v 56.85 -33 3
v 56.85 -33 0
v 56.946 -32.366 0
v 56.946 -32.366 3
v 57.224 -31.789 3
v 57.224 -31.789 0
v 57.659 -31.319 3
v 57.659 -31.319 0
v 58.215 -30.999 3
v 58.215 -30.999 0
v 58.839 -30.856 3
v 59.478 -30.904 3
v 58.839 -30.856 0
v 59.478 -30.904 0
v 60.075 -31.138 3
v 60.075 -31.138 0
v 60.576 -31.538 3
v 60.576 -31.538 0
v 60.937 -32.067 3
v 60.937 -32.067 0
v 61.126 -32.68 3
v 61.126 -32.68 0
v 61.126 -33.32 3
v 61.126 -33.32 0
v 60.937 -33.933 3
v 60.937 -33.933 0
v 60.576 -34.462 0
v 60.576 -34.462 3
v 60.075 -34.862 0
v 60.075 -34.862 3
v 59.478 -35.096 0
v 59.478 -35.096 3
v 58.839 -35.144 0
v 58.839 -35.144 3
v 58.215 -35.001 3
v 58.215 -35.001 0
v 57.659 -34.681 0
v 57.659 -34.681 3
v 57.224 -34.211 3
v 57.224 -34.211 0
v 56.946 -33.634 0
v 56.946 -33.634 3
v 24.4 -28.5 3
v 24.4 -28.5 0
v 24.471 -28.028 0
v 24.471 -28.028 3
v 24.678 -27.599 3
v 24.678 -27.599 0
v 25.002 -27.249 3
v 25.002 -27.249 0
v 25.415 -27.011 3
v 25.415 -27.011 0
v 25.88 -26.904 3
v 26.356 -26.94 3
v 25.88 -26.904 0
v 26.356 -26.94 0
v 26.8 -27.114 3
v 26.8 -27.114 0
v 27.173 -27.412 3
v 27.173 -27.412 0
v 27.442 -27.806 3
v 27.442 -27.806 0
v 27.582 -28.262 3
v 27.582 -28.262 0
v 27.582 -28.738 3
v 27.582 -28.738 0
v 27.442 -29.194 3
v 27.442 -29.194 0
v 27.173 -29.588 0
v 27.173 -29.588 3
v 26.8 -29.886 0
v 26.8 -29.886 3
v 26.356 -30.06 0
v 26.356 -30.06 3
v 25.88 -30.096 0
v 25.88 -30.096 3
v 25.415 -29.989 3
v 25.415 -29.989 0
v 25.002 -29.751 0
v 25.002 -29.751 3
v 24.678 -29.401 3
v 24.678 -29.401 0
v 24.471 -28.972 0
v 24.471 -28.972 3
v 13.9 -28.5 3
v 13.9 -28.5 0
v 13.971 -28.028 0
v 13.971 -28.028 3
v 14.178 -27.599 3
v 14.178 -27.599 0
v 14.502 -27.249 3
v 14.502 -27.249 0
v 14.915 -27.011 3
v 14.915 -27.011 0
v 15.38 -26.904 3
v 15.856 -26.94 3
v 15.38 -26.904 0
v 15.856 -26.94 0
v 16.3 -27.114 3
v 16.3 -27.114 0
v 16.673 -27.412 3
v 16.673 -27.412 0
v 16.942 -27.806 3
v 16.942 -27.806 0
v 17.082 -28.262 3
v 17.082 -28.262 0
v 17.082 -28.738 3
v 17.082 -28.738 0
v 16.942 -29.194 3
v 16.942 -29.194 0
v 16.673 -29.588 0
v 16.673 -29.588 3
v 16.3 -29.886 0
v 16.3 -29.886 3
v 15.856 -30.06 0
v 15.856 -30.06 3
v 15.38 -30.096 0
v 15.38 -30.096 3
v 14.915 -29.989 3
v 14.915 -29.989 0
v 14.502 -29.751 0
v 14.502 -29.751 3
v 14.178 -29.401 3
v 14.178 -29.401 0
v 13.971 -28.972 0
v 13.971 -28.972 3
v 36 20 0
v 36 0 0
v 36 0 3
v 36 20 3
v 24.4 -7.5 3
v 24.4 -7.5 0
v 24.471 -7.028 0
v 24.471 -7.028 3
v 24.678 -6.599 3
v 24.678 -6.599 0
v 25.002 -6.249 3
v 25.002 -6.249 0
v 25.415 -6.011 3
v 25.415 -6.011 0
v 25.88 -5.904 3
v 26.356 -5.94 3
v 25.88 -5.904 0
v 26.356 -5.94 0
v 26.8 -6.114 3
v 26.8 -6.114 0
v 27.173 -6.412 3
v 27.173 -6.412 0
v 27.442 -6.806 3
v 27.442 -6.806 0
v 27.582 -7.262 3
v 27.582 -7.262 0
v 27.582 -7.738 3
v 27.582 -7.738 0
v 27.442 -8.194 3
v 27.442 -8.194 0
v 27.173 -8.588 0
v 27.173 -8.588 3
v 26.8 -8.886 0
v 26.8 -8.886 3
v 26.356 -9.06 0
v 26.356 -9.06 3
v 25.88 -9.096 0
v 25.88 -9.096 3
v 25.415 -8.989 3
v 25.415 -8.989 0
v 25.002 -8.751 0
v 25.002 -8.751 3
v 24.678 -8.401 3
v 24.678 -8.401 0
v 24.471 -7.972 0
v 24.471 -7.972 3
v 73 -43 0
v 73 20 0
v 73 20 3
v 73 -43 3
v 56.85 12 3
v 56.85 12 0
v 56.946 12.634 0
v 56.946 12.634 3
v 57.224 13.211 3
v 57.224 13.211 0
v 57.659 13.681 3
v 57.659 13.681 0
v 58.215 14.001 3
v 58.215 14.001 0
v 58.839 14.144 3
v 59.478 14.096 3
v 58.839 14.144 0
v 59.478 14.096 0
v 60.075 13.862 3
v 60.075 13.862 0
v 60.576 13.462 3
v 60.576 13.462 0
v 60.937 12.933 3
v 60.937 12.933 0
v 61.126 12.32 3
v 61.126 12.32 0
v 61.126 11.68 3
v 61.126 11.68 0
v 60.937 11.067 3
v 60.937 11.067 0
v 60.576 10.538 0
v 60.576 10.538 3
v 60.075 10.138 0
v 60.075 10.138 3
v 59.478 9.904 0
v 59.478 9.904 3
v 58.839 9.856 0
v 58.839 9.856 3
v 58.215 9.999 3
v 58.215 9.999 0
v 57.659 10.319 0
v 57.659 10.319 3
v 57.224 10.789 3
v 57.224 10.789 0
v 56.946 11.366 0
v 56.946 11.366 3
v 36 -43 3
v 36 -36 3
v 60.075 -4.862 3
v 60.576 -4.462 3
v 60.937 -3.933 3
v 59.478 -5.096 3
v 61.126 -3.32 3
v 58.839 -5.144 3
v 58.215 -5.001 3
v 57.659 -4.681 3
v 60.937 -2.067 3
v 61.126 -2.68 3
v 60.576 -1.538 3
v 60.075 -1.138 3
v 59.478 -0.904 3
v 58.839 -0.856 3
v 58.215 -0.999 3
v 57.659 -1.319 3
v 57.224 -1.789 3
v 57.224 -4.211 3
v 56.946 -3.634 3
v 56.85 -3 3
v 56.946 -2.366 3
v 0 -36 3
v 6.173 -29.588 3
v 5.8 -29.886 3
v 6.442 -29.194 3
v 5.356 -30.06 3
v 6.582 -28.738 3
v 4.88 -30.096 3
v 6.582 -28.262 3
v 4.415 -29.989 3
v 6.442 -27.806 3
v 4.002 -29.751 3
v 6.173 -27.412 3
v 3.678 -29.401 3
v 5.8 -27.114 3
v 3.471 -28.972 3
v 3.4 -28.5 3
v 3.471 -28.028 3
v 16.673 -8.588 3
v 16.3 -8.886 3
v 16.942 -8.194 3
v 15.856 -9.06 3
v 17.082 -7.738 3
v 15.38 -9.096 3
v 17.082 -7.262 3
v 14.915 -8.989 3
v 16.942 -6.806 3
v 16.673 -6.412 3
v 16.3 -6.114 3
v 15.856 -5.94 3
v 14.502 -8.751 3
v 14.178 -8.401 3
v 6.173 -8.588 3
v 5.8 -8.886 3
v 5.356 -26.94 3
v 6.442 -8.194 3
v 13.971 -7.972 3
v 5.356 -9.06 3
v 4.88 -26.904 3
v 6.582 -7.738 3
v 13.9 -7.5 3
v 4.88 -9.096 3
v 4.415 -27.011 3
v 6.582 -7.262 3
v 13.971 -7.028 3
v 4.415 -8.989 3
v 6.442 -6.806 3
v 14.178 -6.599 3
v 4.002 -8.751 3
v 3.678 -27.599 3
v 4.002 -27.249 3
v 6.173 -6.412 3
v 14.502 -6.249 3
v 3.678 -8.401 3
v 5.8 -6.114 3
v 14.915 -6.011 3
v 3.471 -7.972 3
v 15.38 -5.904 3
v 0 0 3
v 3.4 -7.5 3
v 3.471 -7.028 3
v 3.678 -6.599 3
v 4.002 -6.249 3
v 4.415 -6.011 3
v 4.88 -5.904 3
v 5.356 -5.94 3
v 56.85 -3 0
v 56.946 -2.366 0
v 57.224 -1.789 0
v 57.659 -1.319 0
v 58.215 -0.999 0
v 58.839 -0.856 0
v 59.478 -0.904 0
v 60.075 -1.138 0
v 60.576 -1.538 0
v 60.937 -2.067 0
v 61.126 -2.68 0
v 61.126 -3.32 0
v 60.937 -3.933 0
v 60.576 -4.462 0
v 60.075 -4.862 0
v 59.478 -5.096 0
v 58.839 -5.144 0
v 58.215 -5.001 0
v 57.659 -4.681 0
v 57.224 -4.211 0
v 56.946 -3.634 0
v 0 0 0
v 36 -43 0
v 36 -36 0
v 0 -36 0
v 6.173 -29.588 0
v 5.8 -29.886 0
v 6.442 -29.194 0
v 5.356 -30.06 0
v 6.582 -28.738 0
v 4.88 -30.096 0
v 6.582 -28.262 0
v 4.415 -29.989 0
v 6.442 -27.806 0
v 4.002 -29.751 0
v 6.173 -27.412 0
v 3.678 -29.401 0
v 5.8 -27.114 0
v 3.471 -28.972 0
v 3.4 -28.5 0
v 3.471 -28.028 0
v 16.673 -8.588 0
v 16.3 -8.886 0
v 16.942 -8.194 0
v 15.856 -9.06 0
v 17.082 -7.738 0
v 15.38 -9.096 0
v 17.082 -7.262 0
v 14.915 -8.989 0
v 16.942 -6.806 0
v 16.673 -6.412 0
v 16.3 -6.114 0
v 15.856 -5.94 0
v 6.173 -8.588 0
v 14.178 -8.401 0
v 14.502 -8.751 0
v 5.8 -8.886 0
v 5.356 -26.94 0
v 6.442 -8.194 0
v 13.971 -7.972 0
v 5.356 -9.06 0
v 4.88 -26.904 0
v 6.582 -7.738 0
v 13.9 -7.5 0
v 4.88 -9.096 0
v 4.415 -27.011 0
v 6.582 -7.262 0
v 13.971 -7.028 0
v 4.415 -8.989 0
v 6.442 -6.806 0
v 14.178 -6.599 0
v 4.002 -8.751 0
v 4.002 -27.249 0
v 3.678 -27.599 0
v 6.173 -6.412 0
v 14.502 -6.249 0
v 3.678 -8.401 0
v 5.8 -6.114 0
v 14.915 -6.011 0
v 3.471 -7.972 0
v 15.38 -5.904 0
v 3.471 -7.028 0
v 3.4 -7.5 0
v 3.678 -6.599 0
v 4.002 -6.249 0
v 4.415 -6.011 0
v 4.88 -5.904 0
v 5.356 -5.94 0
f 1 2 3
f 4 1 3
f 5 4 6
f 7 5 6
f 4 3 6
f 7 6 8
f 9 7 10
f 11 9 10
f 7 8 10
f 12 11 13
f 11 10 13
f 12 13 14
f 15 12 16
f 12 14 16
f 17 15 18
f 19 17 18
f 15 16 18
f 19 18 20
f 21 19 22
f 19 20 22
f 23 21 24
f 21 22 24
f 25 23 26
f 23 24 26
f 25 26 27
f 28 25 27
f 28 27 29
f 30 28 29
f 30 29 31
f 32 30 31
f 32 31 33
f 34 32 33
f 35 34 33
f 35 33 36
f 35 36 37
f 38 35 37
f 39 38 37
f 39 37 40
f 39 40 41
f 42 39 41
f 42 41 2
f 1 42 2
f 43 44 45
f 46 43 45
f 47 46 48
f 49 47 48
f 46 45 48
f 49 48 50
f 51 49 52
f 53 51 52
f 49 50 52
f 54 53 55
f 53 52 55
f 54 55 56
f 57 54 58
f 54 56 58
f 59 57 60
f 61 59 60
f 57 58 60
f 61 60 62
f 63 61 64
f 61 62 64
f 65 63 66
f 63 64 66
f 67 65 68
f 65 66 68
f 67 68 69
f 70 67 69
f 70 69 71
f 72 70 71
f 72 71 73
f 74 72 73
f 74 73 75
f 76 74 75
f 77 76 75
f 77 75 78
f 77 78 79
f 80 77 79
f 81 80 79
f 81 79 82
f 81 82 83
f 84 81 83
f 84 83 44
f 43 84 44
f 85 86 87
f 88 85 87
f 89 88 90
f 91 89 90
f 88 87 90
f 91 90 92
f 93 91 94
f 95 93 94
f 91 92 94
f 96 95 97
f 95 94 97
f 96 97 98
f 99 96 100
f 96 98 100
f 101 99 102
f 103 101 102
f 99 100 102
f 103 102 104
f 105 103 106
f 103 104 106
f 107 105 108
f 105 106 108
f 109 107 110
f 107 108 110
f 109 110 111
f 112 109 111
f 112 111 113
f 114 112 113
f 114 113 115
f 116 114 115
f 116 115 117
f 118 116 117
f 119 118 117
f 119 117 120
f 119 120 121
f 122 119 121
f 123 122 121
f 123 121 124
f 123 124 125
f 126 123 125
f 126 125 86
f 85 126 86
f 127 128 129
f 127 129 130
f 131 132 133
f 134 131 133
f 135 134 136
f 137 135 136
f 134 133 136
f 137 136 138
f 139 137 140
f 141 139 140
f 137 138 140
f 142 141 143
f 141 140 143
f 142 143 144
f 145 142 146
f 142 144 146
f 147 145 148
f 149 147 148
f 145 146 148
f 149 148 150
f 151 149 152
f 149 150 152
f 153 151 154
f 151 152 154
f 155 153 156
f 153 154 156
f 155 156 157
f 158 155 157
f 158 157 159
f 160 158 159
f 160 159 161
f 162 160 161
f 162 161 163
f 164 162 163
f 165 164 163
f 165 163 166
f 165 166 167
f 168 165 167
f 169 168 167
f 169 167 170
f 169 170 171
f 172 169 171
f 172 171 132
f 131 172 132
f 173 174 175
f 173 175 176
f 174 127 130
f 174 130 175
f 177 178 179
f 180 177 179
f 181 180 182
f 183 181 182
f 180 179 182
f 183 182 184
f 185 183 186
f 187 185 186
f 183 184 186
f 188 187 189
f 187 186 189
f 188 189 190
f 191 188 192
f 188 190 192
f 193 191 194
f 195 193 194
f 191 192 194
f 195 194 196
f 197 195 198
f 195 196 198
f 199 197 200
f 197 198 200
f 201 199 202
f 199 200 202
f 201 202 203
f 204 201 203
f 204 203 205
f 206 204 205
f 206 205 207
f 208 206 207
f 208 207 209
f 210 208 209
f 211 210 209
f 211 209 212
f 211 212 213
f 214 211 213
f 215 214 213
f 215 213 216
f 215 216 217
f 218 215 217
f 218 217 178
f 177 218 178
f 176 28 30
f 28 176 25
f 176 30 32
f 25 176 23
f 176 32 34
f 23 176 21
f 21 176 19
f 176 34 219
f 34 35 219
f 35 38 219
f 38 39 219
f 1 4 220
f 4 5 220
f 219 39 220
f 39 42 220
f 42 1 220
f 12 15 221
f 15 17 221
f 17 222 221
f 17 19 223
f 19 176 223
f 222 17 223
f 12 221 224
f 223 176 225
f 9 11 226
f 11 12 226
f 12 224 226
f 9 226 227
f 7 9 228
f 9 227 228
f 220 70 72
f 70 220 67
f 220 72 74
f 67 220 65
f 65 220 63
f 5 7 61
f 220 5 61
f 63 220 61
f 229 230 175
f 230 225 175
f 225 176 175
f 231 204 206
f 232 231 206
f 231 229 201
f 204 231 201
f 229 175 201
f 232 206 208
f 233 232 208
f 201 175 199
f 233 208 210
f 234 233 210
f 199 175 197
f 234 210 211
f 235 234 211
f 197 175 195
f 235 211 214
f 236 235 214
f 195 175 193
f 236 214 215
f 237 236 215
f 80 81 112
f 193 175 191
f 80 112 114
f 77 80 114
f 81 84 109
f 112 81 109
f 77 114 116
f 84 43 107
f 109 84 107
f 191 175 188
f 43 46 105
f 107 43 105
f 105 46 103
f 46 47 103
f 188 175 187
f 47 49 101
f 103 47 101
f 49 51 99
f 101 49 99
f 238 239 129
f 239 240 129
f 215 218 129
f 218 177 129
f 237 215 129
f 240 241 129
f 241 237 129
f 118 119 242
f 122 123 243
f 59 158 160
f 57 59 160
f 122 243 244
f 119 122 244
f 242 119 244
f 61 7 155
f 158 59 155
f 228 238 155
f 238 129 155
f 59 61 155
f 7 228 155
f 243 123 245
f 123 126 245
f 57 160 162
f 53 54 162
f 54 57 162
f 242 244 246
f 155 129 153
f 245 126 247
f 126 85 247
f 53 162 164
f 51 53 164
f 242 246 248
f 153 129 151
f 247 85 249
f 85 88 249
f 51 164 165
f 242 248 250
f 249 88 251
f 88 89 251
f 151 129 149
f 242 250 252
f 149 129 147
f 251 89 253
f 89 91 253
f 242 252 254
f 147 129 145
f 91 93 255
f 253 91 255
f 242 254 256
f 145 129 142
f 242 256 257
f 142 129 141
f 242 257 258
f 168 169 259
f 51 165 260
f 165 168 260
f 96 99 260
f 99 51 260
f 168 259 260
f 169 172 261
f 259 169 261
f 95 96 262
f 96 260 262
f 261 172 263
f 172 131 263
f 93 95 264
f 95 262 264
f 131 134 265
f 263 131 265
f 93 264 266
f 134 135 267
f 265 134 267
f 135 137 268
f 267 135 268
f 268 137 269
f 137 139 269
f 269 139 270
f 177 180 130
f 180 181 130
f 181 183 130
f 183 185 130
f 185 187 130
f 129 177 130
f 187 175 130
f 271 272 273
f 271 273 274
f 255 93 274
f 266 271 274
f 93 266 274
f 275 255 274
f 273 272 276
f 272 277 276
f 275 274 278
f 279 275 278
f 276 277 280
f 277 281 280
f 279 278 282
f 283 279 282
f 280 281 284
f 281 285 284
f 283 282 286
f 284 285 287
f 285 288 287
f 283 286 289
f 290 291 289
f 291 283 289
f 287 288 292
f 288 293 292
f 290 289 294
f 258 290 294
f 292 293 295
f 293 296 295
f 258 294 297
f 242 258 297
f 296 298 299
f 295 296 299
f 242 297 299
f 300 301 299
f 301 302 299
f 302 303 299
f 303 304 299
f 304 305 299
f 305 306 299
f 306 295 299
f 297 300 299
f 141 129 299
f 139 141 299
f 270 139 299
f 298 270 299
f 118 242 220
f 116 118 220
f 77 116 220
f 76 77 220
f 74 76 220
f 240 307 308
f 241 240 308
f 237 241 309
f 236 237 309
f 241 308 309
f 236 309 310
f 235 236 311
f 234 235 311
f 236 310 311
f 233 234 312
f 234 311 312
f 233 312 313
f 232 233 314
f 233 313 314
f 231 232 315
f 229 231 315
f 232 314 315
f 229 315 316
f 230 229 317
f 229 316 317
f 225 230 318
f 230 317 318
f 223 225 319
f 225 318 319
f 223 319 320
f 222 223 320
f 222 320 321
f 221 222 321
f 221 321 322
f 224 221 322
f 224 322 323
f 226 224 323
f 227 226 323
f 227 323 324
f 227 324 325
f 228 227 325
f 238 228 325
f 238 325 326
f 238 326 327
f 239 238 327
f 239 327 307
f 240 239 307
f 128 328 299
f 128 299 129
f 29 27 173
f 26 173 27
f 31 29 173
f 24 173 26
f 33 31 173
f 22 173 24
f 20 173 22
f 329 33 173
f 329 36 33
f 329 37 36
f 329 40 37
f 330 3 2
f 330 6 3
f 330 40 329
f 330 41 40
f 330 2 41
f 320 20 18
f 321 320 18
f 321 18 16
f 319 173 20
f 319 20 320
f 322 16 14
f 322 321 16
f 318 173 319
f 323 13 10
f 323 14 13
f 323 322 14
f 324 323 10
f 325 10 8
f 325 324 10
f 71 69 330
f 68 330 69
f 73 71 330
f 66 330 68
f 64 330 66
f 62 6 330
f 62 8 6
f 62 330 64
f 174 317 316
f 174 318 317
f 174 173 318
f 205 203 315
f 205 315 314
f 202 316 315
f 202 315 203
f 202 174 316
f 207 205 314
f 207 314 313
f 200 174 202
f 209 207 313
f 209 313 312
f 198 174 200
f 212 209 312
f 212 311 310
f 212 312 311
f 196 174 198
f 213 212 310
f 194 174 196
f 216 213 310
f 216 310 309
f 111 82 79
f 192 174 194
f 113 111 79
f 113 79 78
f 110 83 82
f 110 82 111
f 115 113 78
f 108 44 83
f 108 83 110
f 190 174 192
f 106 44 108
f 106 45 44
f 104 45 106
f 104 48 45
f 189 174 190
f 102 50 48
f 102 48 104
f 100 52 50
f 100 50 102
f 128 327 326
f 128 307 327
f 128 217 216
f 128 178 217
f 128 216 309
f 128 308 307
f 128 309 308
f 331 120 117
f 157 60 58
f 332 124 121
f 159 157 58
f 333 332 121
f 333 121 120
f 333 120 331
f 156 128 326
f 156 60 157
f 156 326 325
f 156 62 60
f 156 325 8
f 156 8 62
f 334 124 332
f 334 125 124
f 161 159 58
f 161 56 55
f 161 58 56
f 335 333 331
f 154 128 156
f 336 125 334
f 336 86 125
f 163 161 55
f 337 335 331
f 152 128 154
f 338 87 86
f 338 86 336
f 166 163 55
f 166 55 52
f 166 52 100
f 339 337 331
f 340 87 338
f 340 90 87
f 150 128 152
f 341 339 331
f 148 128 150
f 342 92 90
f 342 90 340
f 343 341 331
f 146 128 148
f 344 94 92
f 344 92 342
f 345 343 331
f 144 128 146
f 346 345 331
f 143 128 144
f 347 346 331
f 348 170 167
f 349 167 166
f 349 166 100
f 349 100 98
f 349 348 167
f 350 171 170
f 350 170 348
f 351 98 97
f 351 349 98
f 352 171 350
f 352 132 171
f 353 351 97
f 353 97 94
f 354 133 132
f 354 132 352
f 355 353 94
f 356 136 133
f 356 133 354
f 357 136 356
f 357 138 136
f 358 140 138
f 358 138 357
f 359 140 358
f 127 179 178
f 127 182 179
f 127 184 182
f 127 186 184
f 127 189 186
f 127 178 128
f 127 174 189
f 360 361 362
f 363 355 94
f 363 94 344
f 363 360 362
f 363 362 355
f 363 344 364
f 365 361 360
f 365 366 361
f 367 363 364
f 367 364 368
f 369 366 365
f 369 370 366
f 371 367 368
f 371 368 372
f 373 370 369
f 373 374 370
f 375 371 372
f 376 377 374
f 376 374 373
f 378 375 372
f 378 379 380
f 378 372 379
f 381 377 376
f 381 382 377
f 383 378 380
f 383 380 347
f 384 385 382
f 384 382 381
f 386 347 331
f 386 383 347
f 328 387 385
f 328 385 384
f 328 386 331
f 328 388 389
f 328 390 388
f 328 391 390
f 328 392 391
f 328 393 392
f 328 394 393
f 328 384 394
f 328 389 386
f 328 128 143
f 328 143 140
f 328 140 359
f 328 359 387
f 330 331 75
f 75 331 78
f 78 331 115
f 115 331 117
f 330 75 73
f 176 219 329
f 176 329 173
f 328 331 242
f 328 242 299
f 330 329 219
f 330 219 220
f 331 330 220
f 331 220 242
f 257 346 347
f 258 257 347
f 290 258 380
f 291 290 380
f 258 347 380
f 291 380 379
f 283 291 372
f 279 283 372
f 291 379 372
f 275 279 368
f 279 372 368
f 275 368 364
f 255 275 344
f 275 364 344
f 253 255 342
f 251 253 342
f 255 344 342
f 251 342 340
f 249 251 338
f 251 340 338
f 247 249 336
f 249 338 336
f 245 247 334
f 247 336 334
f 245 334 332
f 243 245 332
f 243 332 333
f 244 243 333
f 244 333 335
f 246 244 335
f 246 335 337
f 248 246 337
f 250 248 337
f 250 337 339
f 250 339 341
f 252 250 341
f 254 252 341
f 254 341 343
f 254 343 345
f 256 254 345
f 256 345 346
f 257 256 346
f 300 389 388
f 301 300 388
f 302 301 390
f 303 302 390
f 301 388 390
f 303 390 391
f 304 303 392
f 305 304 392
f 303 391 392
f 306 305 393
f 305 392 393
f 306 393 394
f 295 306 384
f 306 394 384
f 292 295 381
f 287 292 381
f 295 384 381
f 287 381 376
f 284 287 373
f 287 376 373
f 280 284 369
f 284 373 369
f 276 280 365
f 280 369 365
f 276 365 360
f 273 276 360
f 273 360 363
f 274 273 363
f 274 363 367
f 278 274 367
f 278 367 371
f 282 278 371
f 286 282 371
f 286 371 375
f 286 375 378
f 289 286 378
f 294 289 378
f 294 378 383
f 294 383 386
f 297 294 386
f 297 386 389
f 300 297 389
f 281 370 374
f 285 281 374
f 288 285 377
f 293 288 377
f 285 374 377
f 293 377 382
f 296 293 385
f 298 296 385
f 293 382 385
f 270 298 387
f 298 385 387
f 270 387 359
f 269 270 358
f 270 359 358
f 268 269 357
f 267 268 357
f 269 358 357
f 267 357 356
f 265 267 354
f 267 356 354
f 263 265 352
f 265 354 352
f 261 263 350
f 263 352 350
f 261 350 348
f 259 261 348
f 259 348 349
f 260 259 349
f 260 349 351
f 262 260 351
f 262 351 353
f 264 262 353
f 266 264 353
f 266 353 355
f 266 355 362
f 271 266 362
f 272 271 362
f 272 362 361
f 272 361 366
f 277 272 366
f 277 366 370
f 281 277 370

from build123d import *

# Parameters (mm, degrees)
EXTRUDE_1_DEPTH     = 3
SKETCH_2_R          = 1.6
CUT_EXTRUDE_1_DEPTH = 93.054331783
SKETCH_3_R          = 2.15
CUT_EXTRUDE_2_DEPTH = 93.054331783
SKETCH_4_R          = 2.15
CUT_EXTRUDE_3_DEPTH = 93.054331783
SKETCH_5_W          = 37
SKETCH_5_H          = 13
CUT_EXTRUDE_4_DEPTH = 93.054331783


with BuildPart() as part:
    # 草图1 → 凸台-拉伸1 (new body)
    with BuildSketch(Plane.XY):
        Polygon((0, 0), (36, 0), (36, 20), (73, 20), (73, -56), (36, -56), (36, -36), (0, -36), align=None)
    extrude(amount=EXTRUDE_1_DEPTH)

    # 草图2 → 切除-拉伸1 (cut, through all)
    with BuildSketch(Plane(origin=(0, 0, 0), x_dir=(-1, 0, 0), z_dir=(0, 0, -1))):
        with Locations((-26, -7.5)):
            Circle(SKETCH_2_R)
        with Locations((-26, -28.5)):
            Circle(SKETCH_2_R)
        with Locations((-5, -7.5)):
            Circle(SKETCH_2_R)
        with Locations((-5, -28.5)):
            Circle(SKETCH_2_R)
        with Locations((-15.5, -28.5)):
            Circle(SKETCH_2_R)
        with Locations((-15.5, -7.5)):
            Circle(SKETCH_2_R)
    extrude(amount=-CUT_EXTRUDE_1_DEPTH, mode=Mode.SUBTRACT)

    # 草图3 → 切除-拉伸2 (cut, through all)
    with BuildSketch(Plane(origin=(0, 0, 0), x_dir=(-1, 0, 0), z_dir=(0, 0, -1))):
        with Locations((-59, -33)):
            Circle(SKETCH_3_R)
        with Locations((-59, -48)):
            Circle(SKETCH_3_R)
    extrude(amount=-CUT_EXTRUDE_2_DEPTH, mode=Mode.SUBTRACT)

    # 草图4 → 切除-拉伸3 (cut, through all)
    with BuildSketch(Plane(origin=(0, 0, 0), x_dir=(-1, 0, 0), z_dir=(0, 0, -1))):
        with Locations((-59, 12)):
            Circle(SKETCH_4_R)
        with Locations((-59, -3)):
            Circle(SKETCH_4_R)
    extrude(amount=-CUT_EXTRUDE_3_DEPTH, mode=Mode.SUBTRACT)

    # 草图5 → 切除-拉伸4 (cut, through all)
    with BuildSketch(Plane.XY.offset(3)):
        with Locations((54.5, -49.5)):
            Rectangle(SKETCH_5_W, SKETCH_5_H)
    extrude(amount=-CUT_EXTRUDE_4_DEPTH, mode=Mode.SUBTRACT)


solid = part.part
